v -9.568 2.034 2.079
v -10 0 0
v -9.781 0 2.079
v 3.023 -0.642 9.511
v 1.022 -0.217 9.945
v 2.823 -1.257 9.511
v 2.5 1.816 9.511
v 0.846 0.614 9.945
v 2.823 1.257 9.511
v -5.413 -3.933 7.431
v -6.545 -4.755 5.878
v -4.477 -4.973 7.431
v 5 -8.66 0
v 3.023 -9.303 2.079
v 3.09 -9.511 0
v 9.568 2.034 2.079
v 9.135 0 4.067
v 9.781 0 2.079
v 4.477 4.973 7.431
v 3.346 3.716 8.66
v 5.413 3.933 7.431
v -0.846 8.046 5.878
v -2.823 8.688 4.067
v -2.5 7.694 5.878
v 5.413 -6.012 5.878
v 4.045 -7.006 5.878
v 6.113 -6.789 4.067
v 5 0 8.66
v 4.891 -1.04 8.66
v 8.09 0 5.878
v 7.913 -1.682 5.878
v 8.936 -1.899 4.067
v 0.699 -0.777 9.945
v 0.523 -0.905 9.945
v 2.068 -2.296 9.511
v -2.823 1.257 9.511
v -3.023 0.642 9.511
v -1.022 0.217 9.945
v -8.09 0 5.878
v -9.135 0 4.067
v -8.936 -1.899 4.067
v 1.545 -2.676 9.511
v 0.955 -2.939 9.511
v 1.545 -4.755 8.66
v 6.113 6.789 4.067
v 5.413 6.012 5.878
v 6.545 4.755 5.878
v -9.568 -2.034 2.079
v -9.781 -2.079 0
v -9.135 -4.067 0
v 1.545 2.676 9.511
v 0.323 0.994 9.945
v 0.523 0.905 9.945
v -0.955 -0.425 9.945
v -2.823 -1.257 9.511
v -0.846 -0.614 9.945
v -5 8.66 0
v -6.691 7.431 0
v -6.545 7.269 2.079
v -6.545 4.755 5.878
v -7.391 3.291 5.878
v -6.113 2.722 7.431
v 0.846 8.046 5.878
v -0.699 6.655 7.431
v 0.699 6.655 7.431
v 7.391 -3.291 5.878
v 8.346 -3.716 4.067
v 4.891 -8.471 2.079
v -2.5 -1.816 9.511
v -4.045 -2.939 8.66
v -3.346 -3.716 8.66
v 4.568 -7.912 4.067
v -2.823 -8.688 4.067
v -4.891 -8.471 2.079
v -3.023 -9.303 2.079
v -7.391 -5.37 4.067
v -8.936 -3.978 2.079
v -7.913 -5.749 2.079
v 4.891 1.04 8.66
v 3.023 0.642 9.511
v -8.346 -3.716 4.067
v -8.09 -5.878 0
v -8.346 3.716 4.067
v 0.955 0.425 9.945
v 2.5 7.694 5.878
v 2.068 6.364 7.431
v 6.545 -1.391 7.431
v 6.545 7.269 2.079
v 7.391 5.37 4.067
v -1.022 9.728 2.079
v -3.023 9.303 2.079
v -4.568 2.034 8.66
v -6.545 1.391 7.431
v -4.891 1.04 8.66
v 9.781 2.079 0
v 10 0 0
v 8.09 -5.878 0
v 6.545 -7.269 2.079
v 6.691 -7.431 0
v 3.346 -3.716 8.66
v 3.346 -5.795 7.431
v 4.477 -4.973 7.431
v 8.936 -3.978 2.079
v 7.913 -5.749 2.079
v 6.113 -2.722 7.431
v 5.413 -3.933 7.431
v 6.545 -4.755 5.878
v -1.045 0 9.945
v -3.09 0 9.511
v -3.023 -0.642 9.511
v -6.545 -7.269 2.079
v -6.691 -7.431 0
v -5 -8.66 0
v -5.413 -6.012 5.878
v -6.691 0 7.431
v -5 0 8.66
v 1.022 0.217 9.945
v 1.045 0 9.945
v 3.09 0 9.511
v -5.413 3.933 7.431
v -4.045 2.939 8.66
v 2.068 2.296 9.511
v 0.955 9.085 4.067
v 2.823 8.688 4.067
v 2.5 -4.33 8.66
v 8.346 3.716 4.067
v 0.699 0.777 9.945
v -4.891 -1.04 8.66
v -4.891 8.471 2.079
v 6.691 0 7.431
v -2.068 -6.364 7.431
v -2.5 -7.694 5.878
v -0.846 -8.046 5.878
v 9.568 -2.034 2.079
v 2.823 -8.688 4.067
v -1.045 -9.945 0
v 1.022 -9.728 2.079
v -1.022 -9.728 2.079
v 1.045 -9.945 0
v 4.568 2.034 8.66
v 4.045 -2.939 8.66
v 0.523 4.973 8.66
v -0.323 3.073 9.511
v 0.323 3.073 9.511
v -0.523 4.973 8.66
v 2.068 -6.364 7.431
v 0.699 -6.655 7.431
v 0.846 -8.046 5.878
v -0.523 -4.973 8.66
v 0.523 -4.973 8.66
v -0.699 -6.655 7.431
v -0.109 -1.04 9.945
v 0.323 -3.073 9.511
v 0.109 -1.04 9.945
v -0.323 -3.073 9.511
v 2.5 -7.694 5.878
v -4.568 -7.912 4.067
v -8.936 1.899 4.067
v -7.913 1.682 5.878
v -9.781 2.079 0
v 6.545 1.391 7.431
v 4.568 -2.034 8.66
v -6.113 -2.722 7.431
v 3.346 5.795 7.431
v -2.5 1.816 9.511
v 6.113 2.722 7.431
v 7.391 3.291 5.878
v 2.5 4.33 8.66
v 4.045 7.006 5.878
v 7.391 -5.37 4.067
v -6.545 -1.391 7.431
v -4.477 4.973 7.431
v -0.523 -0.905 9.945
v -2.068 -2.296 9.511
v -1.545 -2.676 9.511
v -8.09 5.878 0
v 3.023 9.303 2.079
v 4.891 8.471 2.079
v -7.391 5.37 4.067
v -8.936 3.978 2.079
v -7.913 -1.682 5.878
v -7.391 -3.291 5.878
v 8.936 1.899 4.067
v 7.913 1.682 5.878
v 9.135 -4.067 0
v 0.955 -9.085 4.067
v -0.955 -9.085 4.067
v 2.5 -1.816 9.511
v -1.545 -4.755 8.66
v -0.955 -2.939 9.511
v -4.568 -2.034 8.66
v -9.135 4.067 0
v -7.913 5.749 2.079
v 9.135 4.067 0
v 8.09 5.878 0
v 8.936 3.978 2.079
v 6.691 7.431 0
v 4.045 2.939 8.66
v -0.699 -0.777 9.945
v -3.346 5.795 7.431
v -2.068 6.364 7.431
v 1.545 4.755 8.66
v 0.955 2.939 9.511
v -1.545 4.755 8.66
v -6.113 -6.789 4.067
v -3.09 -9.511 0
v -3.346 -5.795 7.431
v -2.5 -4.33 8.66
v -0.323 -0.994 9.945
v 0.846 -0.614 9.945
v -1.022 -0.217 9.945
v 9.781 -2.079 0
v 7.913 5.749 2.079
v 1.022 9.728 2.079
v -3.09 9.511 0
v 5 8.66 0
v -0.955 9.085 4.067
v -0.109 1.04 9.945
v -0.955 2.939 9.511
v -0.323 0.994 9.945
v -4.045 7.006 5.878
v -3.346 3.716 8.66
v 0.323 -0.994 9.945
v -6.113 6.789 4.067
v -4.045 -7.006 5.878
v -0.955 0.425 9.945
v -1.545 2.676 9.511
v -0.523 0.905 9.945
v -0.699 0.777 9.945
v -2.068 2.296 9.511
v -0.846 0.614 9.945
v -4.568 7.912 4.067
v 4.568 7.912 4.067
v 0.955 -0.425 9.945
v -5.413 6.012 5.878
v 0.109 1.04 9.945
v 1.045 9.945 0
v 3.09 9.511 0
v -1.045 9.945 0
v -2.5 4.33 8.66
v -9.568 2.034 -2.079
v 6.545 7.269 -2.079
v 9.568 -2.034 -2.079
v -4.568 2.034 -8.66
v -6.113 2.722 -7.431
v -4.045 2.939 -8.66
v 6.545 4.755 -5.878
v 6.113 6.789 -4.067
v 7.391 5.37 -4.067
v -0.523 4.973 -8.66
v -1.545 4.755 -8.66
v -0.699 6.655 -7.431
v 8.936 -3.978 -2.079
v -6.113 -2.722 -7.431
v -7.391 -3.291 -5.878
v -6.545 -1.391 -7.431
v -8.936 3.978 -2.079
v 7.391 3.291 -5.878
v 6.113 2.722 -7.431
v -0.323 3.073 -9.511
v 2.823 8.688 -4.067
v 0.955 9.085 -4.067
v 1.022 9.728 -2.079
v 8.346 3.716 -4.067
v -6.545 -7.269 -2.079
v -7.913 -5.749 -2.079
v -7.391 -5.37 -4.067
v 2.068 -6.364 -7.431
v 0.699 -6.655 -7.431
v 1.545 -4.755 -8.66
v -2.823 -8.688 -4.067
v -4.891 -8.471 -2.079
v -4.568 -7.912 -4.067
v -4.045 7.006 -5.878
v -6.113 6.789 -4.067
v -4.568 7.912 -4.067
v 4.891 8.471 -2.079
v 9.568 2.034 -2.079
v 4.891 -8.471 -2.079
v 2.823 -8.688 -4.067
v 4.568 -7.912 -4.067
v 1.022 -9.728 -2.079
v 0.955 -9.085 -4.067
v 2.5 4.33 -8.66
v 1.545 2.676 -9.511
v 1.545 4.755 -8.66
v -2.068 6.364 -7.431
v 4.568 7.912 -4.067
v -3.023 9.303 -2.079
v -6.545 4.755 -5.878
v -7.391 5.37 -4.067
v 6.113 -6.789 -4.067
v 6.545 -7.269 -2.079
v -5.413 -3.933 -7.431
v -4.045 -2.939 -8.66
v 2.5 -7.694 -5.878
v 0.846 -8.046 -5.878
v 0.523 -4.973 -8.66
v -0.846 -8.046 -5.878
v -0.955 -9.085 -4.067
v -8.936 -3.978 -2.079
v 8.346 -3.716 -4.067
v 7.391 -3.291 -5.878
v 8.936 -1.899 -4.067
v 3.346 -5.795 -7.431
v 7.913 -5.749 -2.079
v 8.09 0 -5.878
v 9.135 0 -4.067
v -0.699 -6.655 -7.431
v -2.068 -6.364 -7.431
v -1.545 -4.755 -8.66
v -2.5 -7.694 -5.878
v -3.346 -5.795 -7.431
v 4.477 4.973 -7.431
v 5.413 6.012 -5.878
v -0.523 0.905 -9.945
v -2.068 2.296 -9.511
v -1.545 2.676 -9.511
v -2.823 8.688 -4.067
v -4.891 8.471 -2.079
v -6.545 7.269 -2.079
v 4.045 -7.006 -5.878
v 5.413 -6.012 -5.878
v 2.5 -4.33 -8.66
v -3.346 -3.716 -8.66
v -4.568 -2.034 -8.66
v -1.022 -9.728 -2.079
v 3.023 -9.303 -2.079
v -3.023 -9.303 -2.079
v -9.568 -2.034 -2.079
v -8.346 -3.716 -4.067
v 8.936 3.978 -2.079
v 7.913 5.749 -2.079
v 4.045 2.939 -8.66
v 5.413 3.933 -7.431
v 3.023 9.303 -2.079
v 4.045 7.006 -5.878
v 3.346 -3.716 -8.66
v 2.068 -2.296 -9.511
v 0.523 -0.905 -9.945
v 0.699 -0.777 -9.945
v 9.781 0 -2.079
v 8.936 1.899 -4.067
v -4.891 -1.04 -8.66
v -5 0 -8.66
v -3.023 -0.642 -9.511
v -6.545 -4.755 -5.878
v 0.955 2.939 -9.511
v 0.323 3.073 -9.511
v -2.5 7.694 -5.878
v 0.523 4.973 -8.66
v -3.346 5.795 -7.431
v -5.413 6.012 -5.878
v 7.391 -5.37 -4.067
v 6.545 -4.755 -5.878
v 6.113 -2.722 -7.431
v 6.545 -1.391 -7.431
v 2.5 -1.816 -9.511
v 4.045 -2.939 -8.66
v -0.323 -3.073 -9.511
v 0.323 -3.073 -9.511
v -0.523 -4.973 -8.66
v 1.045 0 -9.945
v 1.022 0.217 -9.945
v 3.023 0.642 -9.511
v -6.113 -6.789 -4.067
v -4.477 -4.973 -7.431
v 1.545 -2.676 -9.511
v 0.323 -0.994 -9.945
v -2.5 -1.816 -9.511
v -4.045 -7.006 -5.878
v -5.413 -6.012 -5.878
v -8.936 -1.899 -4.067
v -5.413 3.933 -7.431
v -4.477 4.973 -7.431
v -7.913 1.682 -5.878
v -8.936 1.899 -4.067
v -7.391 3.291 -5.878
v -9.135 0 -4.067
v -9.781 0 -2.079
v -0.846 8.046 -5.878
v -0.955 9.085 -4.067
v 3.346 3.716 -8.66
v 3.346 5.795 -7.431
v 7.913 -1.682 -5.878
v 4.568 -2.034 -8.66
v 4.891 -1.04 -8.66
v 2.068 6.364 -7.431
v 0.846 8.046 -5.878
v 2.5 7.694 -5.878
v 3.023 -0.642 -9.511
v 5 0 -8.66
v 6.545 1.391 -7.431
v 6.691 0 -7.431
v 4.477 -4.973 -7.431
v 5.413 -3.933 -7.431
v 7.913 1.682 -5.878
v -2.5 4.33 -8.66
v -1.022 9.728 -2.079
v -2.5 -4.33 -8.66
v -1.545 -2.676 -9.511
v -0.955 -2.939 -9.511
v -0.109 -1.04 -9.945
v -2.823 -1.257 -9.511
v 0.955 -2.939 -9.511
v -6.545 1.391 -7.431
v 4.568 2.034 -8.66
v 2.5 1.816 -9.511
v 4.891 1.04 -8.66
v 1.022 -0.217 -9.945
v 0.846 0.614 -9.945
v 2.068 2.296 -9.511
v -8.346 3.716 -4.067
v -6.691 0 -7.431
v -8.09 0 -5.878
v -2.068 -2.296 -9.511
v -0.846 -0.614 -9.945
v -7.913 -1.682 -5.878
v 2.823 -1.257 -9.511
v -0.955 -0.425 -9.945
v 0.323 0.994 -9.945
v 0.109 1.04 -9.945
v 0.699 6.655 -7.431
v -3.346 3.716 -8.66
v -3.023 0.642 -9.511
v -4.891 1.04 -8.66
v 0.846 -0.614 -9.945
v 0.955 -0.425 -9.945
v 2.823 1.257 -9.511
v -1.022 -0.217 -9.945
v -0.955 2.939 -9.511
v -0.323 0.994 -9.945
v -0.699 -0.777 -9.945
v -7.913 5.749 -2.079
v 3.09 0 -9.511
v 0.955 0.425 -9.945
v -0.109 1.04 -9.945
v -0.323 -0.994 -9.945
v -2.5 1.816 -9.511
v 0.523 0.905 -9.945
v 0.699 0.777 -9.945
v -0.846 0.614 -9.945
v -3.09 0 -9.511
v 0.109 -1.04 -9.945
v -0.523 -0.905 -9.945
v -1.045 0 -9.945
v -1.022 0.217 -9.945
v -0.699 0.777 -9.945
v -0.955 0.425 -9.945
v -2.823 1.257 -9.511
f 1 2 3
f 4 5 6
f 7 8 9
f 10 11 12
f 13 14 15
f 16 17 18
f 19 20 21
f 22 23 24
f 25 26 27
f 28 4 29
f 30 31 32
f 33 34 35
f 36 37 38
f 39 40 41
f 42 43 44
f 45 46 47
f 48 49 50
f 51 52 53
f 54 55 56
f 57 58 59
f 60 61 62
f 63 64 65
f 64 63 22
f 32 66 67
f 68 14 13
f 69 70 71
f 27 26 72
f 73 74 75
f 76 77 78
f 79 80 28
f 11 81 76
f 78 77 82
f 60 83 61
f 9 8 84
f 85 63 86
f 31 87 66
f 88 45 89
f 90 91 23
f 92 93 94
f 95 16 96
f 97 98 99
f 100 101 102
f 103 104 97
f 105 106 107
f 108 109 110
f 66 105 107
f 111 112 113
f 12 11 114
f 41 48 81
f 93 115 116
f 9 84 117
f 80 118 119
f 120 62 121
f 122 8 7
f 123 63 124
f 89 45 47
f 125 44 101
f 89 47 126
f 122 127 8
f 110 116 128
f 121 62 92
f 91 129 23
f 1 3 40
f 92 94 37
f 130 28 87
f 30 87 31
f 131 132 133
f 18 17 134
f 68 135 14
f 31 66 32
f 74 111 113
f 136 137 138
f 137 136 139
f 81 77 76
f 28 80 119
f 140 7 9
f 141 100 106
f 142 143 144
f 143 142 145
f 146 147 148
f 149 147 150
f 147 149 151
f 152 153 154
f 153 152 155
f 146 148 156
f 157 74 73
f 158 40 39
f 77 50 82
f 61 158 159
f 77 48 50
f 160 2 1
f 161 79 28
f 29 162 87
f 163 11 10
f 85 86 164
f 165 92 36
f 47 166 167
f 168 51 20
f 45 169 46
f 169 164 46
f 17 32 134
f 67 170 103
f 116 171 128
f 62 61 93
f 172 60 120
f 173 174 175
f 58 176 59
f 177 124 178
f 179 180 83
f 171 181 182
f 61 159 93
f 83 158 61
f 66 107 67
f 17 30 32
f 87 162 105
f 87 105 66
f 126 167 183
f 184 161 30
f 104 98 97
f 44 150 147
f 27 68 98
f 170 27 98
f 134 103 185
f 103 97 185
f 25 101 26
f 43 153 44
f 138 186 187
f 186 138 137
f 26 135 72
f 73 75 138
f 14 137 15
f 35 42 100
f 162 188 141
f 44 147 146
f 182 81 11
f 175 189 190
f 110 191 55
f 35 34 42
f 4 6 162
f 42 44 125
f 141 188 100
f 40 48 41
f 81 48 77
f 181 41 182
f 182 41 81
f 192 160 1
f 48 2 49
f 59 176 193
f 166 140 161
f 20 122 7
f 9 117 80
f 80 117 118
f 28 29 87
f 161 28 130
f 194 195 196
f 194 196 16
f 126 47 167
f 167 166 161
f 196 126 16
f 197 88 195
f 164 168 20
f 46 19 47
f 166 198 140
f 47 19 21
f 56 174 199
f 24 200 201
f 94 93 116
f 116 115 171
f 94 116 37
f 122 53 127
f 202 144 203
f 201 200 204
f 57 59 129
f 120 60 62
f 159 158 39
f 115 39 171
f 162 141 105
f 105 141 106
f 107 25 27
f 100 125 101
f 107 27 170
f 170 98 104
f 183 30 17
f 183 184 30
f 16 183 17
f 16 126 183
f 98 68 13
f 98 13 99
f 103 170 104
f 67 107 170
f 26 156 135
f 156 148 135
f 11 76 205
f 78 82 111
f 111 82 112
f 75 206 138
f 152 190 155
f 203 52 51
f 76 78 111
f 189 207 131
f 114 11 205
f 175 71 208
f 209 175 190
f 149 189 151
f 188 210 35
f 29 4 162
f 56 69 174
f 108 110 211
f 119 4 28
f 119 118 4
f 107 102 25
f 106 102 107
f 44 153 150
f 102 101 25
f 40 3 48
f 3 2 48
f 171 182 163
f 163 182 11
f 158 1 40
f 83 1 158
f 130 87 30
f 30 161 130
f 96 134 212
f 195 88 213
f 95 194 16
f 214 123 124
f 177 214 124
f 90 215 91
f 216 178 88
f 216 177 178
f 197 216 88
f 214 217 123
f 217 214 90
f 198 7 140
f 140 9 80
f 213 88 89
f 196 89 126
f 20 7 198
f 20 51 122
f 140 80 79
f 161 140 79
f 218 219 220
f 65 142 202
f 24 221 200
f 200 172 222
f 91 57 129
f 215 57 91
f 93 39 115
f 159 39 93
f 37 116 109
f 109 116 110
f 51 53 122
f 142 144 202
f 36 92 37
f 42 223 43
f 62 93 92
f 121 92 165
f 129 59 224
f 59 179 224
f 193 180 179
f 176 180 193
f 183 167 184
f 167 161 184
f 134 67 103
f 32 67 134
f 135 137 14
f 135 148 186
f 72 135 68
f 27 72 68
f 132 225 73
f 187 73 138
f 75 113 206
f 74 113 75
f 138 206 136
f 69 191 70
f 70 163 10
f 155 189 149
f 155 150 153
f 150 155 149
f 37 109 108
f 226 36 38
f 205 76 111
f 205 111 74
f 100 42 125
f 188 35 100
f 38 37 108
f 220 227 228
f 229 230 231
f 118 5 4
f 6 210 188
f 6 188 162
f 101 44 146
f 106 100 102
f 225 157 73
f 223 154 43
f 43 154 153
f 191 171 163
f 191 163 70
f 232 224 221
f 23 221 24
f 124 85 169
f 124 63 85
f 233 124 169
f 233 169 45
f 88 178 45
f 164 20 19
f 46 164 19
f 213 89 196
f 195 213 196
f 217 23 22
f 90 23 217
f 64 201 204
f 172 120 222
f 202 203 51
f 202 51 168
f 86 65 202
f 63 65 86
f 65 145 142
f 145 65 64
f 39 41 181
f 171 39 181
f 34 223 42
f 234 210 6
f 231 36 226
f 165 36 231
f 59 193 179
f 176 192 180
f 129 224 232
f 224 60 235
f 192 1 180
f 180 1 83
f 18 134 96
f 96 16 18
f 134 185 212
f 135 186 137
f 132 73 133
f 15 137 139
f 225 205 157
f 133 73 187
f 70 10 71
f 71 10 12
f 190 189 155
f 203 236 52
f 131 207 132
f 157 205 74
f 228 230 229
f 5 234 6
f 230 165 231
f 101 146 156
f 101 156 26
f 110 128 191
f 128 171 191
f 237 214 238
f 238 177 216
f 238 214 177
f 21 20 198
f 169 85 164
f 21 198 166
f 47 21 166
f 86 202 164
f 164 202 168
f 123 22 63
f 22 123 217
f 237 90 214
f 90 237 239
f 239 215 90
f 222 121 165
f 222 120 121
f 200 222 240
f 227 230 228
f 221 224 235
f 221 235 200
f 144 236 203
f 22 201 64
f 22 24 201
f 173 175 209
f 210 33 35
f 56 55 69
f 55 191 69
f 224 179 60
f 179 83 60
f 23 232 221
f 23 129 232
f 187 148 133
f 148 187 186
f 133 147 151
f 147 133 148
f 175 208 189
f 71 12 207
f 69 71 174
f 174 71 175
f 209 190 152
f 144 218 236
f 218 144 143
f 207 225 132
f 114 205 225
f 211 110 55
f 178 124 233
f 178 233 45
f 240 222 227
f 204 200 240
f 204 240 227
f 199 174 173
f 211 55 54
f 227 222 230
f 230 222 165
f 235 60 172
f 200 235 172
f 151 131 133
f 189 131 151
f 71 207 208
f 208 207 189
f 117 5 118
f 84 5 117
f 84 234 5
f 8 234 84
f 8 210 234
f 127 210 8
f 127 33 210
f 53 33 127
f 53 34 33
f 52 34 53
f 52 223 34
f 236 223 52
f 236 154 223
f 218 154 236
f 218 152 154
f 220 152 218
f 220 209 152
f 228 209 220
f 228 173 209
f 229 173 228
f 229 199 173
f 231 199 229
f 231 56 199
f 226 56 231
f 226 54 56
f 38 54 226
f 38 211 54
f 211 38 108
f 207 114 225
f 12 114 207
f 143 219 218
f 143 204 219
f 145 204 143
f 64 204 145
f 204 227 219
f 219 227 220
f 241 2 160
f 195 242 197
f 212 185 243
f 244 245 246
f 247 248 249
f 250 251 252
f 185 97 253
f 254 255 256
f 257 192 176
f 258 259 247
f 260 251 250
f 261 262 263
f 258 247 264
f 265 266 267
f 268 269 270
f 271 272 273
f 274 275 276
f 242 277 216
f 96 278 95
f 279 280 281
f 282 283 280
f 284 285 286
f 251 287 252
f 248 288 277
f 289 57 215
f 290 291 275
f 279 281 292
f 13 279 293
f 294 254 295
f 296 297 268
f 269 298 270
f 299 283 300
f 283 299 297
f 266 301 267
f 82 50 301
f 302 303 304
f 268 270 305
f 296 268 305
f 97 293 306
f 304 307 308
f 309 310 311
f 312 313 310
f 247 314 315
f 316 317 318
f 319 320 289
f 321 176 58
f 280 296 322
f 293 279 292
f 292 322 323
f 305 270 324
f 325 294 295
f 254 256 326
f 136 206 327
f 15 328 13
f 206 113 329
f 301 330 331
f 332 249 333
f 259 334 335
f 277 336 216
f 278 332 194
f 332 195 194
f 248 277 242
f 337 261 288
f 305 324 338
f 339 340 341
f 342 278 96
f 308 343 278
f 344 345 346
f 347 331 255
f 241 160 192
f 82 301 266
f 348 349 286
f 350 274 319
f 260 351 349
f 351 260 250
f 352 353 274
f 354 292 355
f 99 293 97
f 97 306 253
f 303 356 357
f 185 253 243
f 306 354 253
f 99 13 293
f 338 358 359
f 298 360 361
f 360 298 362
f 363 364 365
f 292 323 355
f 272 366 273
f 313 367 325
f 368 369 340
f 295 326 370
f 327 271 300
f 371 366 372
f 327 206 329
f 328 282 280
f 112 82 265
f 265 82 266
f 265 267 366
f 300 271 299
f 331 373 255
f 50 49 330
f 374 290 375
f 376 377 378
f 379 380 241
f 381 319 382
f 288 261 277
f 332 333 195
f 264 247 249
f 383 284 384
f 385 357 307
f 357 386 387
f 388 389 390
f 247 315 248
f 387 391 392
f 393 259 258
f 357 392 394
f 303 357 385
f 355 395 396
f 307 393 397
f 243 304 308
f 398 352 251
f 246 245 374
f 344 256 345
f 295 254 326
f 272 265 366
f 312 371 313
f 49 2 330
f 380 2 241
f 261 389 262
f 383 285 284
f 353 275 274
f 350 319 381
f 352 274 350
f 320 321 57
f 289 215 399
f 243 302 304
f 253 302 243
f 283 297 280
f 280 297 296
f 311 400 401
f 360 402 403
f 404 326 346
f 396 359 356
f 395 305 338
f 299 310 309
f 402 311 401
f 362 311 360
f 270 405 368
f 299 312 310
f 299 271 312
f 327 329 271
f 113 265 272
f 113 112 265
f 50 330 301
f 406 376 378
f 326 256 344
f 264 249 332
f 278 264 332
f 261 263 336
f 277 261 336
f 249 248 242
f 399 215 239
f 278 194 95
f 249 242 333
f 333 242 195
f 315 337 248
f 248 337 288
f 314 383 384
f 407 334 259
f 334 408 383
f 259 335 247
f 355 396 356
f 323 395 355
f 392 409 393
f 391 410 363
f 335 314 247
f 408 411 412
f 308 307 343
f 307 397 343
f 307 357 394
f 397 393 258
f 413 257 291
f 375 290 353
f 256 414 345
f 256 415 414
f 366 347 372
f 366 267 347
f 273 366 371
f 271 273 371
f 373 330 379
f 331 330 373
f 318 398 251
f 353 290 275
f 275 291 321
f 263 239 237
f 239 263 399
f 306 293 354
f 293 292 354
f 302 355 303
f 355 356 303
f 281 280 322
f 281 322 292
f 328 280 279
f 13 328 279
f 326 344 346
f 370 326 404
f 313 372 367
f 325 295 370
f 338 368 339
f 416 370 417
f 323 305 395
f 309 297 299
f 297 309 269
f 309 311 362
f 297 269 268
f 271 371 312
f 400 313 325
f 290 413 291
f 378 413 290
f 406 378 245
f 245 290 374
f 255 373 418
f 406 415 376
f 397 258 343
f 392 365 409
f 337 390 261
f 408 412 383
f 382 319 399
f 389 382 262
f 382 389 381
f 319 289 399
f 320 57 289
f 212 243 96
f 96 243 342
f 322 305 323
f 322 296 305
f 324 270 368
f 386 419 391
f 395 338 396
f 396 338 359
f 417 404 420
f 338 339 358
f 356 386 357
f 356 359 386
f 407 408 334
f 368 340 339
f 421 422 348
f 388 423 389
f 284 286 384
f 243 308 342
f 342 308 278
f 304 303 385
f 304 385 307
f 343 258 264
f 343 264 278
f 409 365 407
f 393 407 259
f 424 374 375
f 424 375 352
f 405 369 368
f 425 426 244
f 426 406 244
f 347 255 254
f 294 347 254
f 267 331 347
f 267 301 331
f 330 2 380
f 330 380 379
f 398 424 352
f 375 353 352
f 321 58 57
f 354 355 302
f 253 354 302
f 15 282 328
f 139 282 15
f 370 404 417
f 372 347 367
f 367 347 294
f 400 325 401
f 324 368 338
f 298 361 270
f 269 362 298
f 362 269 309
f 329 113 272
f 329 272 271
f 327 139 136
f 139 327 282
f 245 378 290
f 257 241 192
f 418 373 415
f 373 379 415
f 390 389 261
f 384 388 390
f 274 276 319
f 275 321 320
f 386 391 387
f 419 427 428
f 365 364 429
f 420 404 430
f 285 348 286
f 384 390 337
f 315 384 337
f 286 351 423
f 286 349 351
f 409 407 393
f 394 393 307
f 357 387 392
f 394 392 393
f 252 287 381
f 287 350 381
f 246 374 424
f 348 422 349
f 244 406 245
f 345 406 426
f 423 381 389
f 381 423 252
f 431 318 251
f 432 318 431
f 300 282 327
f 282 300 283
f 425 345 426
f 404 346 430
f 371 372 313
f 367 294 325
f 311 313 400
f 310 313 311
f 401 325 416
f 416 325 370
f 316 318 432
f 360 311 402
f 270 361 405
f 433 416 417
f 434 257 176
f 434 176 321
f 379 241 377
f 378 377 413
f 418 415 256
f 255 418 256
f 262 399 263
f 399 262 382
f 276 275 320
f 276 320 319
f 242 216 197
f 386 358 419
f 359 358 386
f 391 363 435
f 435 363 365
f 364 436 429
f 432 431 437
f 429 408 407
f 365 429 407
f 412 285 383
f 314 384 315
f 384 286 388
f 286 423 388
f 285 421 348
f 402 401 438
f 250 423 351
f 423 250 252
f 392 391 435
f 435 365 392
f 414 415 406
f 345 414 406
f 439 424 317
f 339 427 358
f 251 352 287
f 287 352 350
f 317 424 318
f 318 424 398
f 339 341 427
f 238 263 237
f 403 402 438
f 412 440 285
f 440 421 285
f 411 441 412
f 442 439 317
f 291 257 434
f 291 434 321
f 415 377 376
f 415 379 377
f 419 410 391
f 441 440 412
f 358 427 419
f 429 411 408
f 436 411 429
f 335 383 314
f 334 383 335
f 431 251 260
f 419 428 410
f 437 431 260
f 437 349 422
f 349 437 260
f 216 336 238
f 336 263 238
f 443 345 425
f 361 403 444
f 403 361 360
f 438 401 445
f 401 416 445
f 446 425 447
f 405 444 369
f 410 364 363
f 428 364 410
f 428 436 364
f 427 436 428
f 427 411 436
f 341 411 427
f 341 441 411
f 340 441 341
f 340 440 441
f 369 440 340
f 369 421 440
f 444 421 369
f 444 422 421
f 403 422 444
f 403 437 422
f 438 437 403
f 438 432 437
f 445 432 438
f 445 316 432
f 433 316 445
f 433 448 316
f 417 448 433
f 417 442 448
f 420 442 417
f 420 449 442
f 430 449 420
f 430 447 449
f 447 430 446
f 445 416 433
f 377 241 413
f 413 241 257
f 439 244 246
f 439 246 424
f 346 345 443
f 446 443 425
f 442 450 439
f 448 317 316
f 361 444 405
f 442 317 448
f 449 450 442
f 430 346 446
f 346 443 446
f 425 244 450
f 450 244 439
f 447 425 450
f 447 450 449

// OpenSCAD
//
// CSG rendering issue:
// This results in a blue sphere rather than a sphere consisting of red/blue half spheres
// The reason is likely that OpenCSG doesn't track
// which positive object is the source of what depth fragment and thus lets the last rendered object win.
//

color([1,0,0]) translate([0,0,0]) intersection() {
  sphere(10);
  translate([0,0,10]) cube([20,20,20],center=true);
}

color([0,0,1]) difference() { 
  sphere(10);
  translate([0,0,10]) cube([20,20,20],center=true);
}
